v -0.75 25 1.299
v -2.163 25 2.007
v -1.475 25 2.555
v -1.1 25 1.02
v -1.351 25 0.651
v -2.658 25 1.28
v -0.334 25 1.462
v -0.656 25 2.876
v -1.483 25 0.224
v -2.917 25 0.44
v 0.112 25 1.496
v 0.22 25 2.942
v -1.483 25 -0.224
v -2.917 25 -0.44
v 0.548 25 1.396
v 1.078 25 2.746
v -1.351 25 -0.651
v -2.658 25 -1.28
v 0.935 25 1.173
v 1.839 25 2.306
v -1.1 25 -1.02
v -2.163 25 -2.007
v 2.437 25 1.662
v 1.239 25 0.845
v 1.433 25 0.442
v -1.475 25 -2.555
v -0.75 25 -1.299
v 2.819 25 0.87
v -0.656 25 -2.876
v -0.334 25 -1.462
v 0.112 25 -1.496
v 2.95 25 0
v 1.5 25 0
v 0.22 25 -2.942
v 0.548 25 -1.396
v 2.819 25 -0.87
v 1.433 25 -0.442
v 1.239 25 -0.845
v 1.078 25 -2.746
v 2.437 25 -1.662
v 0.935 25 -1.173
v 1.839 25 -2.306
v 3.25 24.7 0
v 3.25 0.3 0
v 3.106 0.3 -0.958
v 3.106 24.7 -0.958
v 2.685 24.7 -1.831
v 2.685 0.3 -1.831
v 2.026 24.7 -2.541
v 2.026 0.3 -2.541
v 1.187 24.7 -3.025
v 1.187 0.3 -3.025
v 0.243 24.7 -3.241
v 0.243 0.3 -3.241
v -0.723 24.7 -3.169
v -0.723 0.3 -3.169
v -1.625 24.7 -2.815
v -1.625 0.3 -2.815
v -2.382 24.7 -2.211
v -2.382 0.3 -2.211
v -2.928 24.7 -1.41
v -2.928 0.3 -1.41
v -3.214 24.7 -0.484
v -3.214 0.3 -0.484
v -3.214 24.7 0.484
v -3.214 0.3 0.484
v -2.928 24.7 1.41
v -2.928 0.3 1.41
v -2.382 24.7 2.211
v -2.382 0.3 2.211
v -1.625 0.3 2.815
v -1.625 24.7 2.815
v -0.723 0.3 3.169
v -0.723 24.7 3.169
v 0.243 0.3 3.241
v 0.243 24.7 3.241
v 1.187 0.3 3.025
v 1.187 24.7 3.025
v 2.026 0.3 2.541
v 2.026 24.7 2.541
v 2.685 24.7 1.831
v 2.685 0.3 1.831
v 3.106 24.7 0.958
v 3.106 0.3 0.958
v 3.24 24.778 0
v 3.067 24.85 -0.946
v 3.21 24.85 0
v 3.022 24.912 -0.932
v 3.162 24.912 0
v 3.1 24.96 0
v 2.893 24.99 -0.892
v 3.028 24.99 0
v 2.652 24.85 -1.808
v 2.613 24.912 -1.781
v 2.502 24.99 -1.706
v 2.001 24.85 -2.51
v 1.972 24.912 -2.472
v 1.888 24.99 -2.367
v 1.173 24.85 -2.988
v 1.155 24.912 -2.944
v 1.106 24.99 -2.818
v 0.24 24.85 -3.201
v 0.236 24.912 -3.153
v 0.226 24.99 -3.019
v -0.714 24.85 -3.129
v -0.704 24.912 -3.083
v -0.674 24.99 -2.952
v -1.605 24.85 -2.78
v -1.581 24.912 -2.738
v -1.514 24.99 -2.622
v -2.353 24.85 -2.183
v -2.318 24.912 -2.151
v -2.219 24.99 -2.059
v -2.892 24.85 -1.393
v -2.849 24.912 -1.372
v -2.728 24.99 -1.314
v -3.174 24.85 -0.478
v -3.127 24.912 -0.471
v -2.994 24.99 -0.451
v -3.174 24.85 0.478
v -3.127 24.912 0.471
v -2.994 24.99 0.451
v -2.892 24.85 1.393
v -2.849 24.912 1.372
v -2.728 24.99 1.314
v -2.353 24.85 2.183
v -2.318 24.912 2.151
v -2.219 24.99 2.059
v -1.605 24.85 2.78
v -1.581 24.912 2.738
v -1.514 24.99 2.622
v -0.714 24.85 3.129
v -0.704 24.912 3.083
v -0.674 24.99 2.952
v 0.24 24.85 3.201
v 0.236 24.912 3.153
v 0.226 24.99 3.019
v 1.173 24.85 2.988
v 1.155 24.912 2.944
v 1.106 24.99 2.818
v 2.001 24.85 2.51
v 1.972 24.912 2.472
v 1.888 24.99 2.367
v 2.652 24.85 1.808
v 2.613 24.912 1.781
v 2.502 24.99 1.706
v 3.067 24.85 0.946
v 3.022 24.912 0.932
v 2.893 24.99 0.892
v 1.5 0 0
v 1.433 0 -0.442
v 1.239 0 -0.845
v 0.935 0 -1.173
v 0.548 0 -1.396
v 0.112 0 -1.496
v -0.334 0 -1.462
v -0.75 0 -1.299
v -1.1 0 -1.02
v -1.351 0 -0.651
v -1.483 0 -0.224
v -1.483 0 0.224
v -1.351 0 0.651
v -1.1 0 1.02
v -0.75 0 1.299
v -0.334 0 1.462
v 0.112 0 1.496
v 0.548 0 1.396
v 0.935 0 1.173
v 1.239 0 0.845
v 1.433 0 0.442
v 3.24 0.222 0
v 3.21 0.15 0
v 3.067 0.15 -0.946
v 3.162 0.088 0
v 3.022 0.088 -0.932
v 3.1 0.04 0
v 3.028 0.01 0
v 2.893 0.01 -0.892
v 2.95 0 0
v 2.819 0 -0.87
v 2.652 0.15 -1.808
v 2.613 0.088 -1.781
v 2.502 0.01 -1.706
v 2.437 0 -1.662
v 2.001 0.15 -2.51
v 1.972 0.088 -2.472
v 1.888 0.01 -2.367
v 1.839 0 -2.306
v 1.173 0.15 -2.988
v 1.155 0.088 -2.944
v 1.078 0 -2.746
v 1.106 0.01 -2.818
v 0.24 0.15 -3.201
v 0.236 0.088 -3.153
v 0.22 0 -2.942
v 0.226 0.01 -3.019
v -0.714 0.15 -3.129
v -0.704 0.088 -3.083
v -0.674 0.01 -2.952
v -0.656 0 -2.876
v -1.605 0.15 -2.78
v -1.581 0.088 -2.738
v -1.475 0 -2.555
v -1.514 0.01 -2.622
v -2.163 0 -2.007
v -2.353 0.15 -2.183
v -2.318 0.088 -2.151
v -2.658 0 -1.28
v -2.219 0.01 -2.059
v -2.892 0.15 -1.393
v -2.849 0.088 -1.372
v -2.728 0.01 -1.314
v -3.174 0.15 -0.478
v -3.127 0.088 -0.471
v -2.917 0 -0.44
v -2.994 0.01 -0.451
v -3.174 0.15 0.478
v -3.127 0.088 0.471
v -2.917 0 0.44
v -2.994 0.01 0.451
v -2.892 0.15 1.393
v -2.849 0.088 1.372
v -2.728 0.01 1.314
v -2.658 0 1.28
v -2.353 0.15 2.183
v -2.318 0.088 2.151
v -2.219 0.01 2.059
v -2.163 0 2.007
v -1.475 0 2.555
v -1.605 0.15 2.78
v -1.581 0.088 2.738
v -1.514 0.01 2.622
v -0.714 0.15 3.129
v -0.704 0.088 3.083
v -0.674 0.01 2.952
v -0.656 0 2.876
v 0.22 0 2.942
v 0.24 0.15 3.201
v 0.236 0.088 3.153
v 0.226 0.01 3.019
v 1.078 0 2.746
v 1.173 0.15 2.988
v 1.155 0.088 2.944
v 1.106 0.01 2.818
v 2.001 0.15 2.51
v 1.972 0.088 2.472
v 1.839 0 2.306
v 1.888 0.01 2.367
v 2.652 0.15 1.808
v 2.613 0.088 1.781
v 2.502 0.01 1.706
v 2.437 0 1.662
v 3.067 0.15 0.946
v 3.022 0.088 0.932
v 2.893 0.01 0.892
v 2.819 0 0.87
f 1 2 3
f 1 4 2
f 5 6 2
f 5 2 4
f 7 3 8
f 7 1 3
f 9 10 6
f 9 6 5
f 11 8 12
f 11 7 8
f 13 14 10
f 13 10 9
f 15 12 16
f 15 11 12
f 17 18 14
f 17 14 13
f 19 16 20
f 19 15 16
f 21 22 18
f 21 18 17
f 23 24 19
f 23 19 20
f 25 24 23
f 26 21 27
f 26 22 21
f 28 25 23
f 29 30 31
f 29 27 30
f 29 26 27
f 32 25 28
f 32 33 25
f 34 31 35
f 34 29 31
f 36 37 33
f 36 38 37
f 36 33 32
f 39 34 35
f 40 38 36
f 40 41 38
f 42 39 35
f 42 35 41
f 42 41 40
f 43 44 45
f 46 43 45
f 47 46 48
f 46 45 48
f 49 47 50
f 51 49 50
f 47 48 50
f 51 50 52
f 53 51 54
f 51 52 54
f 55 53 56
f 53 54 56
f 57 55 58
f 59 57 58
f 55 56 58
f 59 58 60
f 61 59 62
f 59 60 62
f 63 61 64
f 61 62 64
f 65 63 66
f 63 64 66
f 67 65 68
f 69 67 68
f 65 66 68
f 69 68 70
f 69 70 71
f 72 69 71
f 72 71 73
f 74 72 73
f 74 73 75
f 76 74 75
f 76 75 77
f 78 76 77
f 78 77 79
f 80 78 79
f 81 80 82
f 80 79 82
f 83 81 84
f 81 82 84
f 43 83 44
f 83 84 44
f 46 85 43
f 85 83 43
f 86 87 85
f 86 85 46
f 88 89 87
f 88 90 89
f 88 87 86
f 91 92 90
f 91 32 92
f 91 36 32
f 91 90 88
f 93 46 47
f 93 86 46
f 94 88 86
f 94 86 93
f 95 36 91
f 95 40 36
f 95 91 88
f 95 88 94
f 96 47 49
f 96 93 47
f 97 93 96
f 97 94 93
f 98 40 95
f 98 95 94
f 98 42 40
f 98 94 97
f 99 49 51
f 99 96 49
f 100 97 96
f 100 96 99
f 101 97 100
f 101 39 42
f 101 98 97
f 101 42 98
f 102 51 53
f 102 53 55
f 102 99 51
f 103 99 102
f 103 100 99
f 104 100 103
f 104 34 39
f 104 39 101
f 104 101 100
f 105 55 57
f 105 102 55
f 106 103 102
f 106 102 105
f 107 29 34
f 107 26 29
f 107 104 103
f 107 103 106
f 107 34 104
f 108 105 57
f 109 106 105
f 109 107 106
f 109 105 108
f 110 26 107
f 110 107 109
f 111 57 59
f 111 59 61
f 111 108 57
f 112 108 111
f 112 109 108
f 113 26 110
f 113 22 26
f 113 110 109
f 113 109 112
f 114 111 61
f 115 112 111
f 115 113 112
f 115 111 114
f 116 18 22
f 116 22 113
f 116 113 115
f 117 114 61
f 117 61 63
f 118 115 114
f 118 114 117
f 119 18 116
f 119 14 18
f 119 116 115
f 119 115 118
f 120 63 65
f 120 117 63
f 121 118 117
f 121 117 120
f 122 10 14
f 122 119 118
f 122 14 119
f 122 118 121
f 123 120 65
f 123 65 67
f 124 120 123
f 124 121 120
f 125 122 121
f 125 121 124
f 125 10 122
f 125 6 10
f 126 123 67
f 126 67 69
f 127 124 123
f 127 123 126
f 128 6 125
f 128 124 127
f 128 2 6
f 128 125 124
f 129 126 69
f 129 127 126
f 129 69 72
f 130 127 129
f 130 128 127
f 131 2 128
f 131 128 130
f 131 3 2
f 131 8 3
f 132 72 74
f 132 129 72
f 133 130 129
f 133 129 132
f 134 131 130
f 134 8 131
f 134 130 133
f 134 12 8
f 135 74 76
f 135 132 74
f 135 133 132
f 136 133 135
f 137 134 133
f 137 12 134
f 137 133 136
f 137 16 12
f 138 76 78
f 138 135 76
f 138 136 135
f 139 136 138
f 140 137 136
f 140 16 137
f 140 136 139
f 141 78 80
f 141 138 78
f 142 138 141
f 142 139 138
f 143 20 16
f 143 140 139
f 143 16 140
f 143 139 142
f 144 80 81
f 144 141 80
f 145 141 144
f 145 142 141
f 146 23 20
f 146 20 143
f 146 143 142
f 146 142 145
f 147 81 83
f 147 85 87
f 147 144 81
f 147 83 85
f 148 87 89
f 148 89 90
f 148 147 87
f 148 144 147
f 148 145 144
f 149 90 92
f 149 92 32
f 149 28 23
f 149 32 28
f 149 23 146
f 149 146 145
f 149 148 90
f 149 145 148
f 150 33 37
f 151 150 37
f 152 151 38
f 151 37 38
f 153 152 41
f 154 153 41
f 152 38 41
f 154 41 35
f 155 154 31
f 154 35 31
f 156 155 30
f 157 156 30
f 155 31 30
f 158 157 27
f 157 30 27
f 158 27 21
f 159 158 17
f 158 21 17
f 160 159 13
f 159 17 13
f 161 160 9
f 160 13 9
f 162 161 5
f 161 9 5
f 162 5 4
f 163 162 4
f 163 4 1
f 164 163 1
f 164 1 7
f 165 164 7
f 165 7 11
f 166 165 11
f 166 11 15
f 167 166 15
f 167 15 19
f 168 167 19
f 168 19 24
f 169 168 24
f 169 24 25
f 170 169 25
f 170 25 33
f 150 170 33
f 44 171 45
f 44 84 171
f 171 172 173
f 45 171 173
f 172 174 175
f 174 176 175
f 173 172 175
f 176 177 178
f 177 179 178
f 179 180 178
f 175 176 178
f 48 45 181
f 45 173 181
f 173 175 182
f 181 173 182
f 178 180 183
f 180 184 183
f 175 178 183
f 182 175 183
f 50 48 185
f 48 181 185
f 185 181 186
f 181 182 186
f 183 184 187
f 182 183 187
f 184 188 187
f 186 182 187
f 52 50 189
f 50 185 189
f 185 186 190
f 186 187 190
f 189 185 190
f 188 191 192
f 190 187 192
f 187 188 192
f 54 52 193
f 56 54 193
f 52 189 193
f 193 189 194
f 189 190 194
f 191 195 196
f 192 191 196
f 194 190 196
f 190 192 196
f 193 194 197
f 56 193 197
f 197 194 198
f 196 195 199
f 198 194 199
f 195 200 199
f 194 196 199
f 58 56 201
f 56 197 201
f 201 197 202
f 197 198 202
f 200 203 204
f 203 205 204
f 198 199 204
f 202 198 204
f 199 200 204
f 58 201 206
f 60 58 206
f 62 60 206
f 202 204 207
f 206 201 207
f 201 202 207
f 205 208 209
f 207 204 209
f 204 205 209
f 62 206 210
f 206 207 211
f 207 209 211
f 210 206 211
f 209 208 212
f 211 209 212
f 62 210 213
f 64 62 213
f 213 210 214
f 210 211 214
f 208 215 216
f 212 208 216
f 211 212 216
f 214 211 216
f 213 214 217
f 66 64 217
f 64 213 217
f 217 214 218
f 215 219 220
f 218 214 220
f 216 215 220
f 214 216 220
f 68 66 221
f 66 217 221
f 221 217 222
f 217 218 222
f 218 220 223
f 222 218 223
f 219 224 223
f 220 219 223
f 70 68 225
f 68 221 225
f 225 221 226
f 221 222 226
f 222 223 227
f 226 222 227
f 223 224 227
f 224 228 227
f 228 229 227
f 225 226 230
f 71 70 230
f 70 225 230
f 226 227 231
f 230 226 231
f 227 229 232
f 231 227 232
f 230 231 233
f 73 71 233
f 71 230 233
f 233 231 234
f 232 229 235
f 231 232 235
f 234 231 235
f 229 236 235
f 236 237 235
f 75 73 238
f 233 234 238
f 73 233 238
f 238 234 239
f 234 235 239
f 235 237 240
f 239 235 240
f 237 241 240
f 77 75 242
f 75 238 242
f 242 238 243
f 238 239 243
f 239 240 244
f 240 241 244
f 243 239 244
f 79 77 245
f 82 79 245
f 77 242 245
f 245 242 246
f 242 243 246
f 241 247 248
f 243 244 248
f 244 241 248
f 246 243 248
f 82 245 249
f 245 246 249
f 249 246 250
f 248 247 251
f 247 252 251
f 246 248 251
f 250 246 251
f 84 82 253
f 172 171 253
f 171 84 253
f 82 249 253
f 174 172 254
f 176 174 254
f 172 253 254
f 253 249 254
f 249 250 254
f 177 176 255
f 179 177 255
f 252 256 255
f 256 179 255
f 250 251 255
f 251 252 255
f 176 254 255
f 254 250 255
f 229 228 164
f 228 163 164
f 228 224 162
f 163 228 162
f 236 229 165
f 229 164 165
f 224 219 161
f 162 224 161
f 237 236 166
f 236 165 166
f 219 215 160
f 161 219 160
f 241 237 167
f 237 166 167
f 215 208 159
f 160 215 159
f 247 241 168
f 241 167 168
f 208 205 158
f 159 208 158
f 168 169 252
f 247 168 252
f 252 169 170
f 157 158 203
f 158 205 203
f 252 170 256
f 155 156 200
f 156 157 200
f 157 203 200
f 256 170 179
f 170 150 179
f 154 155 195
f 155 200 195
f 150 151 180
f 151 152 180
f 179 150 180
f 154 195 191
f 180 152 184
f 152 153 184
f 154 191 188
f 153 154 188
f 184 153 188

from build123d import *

# Parameters (mm, degrees)
ESBO_O1_R                = 3.25
RESSALTO_EXTRUS_O1_DEPTH = 25
ESBO_O2_R                = 1.5
CORTE_EXTRUS_O1_DEPTH    = 26
FILETE1_R                = 0.3


with BuildPart() as part:
    # Esboço1 → Ressalto-extrusão1 (new body)
    with BuildSketch(Plane(origin=(0, 0, 0), x_dir=(1, 0, 0), z_dir=(0, 1, 0))):
        Circle(ESBO_O1_R)
    extrude(amount=RESSALTO_EXTRUS_O1_DEPTH)

    # Esboço2 → Corte-extrusão1 (cut, through all)
    with BuildSketch(Plane(origin=(0, 25, 0), x_dir=(1, 0, 0), z_dir=(0, 1, 0))):
        Circle(ESBO_O2_R)
    extrude(amount=-CORTE_EXTRUS_O1_DEPTH, mode=Mode.SUBTRACT)

    # Filete1
    filete1_edges = [part.edges().sort_by_distance(p)[0] for p in [
        (-3.25, 0, 0),
        (-3.25, 25, 0),
    ]]
    fillet(filete1_edges, radius=FILETE1_R)


solid = part.part
